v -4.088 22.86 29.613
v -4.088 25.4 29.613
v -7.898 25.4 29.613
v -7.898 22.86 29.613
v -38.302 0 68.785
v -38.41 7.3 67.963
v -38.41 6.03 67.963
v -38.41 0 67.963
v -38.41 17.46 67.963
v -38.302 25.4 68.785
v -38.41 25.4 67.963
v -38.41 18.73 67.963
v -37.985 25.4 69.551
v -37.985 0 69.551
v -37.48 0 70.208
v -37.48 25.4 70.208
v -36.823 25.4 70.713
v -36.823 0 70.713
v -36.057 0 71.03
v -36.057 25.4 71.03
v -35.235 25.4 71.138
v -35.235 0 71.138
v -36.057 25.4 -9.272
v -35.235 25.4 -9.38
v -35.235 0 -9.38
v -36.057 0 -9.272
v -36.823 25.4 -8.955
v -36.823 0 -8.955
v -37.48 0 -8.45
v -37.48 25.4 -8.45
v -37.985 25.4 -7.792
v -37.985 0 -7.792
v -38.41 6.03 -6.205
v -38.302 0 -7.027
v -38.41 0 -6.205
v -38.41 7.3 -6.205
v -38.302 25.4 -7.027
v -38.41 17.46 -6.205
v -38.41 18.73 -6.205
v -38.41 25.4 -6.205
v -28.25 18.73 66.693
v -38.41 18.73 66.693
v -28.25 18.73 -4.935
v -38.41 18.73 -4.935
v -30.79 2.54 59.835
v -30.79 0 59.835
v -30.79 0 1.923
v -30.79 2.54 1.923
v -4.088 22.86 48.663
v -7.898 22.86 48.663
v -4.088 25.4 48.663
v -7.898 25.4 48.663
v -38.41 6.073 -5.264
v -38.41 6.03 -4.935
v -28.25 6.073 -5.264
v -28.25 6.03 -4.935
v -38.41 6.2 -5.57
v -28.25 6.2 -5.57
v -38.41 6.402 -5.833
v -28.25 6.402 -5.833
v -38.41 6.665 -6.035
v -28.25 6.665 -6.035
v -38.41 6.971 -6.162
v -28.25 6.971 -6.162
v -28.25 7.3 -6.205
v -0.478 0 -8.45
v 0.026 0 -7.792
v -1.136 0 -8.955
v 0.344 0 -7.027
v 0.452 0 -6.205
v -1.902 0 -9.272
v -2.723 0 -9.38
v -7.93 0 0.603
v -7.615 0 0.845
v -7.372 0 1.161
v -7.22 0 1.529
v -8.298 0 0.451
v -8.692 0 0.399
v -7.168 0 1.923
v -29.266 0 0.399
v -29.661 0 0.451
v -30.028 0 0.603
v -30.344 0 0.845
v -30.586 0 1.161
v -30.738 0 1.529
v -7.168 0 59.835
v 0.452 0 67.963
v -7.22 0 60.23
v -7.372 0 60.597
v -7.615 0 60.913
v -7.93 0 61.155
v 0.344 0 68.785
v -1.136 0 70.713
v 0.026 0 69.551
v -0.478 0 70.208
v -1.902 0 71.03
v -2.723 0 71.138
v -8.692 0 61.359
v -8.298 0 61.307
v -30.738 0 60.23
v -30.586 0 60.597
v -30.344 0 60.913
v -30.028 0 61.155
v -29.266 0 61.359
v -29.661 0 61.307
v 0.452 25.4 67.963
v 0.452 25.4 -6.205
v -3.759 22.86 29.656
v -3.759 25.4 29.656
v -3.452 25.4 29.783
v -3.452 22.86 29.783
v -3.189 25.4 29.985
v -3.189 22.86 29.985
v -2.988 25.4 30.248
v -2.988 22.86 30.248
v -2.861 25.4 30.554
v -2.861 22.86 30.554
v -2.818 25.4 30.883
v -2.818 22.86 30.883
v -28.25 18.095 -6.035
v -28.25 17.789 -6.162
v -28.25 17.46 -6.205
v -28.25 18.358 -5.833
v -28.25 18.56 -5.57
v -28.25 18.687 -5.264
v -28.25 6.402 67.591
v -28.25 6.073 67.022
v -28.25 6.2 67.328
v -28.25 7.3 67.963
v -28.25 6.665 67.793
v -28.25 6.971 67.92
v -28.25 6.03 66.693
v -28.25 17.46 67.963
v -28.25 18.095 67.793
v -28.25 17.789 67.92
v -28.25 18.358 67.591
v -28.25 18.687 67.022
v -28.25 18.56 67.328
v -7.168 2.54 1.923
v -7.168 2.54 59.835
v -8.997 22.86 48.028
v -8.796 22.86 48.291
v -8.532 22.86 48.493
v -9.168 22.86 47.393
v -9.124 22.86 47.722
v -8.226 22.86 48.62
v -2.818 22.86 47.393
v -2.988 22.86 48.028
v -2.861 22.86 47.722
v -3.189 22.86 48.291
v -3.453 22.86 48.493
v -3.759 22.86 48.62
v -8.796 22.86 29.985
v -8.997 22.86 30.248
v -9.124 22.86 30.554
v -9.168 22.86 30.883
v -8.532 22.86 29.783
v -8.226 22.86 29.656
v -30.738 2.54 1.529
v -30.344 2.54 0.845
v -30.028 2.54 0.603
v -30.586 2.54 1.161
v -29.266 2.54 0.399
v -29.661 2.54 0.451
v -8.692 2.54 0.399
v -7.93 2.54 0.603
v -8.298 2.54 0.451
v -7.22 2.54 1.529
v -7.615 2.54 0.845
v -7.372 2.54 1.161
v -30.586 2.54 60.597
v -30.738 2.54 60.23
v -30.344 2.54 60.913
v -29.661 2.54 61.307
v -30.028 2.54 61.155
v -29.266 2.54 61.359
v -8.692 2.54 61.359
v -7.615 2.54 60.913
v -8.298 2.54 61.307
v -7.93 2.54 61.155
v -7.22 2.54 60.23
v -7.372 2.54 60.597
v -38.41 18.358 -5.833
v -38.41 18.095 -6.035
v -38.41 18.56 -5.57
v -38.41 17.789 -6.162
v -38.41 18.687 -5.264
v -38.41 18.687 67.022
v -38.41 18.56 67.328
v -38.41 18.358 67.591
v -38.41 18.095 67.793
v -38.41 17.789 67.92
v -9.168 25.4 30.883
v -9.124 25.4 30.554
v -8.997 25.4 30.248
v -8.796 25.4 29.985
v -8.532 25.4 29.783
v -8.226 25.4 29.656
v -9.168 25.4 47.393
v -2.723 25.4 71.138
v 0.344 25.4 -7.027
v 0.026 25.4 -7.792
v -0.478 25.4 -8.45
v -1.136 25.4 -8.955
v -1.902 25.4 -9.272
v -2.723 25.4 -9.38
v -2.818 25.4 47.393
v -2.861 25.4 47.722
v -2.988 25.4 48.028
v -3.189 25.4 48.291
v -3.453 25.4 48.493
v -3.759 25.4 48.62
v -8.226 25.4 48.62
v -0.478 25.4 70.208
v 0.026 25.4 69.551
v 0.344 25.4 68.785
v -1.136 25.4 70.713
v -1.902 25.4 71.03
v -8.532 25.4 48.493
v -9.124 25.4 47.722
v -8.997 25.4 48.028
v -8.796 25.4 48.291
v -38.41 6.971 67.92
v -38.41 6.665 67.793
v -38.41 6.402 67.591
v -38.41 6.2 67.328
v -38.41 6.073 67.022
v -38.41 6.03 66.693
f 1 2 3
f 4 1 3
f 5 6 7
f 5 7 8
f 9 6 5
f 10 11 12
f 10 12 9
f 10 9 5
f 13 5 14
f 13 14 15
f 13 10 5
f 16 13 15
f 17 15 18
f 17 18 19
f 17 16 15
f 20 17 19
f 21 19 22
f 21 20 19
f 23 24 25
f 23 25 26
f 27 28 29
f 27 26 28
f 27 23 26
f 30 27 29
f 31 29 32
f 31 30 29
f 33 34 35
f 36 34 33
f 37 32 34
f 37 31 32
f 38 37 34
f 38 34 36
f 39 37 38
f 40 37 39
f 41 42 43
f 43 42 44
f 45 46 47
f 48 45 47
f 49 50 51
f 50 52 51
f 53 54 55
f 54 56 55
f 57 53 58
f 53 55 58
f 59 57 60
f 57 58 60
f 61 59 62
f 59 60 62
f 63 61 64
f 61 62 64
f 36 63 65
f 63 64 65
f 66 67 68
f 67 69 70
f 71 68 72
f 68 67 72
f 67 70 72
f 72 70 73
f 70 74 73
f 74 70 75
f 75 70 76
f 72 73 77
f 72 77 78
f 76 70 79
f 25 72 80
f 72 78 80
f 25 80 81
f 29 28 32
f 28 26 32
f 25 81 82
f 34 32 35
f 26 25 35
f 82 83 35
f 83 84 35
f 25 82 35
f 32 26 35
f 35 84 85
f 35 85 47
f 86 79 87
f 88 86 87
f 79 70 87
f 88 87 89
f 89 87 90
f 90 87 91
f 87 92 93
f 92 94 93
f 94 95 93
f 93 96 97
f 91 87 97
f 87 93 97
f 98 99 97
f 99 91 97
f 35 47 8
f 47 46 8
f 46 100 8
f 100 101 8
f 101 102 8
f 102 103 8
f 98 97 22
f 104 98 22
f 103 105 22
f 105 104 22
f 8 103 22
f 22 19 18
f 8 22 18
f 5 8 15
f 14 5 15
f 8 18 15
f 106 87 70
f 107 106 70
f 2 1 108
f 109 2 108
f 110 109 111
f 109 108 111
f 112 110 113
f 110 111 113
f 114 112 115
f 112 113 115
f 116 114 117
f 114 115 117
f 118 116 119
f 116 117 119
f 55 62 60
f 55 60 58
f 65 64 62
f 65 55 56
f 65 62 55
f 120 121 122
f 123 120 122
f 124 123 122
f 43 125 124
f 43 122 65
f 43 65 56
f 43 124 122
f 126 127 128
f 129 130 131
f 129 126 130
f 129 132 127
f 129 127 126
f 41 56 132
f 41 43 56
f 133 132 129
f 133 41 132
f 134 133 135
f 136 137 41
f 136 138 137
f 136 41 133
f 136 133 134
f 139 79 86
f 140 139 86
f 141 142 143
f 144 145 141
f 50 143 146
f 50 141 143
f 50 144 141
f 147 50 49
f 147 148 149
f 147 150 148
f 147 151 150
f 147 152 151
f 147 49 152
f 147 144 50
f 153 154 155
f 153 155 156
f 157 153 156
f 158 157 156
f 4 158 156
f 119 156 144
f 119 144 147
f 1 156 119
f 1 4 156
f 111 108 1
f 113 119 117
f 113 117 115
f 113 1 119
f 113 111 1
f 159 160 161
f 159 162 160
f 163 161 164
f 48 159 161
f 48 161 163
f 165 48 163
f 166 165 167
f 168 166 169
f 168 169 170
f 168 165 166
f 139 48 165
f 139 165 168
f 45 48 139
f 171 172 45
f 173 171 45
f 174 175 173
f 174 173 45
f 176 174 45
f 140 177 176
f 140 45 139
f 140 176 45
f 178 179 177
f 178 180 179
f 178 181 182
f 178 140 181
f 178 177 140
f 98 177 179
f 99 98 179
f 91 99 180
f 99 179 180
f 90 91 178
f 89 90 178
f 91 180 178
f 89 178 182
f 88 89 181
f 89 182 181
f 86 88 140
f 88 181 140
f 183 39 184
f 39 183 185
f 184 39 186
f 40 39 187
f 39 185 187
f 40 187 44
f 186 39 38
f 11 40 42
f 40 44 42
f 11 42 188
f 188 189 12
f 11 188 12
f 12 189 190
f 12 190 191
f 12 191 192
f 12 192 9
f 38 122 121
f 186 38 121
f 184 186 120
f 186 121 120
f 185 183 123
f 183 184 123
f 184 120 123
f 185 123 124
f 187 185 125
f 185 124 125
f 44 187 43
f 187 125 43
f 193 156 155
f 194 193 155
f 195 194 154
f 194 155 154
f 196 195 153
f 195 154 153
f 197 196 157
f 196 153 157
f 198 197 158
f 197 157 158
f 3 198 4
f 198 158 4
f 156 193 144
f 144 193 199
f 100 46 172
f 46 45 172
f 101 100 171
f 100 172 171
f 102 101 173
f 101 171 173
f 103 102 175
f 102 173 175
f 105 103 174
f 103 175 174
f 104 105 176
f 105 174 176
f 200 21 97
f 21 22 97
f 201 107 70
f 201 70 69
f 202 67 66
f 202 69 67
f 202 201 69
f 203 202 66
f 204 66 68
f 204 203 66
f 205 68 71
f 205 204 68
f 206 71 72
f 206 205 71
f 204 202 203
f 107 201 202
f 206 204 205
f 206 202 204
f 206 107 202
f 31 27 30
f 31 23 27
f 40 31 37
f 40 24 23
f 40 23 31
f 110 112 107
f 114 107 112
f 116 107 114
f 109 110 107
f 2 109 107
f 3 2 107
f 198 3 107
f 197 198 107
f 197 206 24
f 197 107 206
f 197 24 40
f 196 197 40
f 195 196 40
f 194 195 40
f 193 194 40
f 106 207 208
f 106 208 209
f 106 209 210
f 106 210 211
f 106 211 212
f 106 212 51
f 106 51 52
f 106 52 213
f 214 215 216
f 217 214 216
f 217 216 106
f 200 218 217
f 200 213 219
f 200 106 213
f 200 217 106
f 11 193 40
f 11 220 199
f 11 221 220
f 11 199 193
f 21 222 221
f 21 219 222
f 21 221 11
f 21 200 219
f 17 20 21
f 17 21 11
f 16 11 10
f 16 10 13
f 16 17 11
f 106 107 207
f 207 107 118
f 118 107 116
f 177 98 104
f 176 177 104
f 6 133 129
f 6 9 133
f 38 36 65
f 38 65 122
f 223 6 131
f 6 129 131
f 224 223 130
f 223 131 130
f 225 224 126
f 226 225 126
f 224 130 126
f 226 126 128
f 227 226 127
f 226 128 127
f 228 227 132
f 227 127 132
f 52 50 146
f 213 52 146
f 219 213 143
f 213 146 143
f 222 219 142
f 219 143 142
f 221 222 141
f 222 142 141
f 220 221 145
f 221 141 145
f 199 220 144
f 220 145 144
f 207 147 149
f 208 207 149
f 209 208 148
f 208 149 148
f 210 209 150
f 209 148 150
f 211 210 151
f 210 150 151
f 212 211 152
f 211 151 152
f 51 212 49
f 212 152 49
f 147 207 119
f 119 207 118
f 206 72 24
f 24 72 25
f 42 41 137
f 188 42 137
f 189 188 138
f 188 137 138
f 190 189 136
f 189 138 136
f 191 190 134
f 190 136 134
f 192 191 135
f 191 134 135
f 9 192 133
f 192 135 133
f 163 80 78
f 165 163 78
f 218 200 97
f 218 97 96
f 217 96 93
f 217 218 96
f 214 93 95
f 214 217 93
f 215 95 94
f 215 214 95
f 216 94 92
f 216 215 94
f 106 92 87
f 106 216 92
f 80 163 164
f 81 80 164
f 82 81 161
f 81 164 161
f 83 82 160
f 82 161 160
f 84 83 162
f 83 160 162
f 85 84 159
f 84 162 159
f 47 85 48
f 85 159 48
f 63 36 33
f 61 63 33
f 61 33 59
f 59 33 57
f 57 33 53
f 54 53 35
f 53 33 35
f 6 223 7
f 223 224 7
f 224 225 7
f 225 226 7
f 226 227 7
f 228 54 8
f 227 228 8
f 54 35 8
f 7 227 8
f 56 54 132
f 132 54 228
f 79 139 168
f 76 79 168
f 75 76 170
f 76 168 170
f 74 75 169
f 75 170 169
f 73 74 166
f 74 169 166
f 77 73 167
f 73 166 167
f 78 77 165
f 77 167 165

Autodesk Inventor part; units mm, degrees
ref_plane "YZ Plane" through (0, 0, 0) normal (1, 0, 0) x (0, 1, 0)
ref_plane "XZ Plane" through (0, 0, 0) normal (0, 1, 0) x (-1, 0, 0)
ref_plane "XY Plane" through (0, 0, 0) normal (0, 0, 1) x (1, 0, 0)
sketch "Sketch2" plane through (0, 0, 0) normal (0, 1, 0) x (-1, 0, 0)
  line L0 (38.4103, 71.1381) -> (-0.4517, 71.1381)
  line L1 (-0.4517, 71.1381) -> (-0.4517, -9.3799)
  line L2 (-0.4517, -9.3799) -> (38.4103, -9.3799)
  line L3 (38.4103, -9.3799) -> (38.4103, 71.1381)
  point P0 (0, 0)
  dimension "d0" = 38.862
  dimension "d1" = 80.518
extrude "Extrusion1" add sketch "Sketch2" along normal blind 25.4
fillet "Fillet1" radius 3.175 4 edges at (-38.4103, 12.7, -9.3799) (0.4517, 12.7, -9.3799) (-38.4103, 12.7, 71.1381) (0.4517, 12.7, 71.1381)
sketch "Sketch3" plane through (0, 0, 0) normal (0, -1, 0) x (1, 0, 0)
  line L0 (-7.1683, 61.3591) -> (-30.7903, 61.3591)
  line L1 (-30.7903, 61.3591) -> (-30.7903, 0.3991)
  line L2 (-30.7903, 0.3991) -> (-7.1683, 0.3991)
  line L3 (-7.1683, 0.3991) -> (-7.1683, 61.3591)
  line L4 (-38.4103, -6.2049) -> (-38.4103, 67.9631) projected
  line L5 (-30.7903, 30.8791) -> (-38.4103, 30.8791) construction
  line L6 (-2.7233, -9.3799) -> (-35.2353, -9.3799) construction
  line L7 (-18.9793, 0.3991) -> (-18.9793, -9.3799) construction
  line L8 (-7.1683, 30.8791) -> (0.4517, 30.8791) construction
  line L9 (0.4517, 67.9631) -> (0.4517, -6.2049) construction
  line L10 (-18.9793, 61.3591) -> (-18.9793, 71.1381) construction
  line L11 (-35.2353, 71.1381) -> (-2.7233, 71.1381) construction
  point P0 (0, 0)
  dimension "d5" = 23.622
  dimension "d6" = 60.96
extrude "Extrusion2" cut sketch "Sketch3" against normal blind 2.54
fillet "Fillet2" radius 1.524 4 edges at (-30.7903, 1.27, 61.3591) (-30.7903, 1.27, 0.3991) (-7.1683, 1.27, 61.3591) (-7.1683, 1.27, 0.3991)
sketch "Sketch4" plane through (0.0246, 25.4, 6.6784) normal (0, 1, 0) x (1, 0, 0)
  line L0 (-2.8421, -22.9344) -> (-9.1921, -22.9344)
  line L1 (-9.1921, -22.9344) -> (-9.1921, -41.9844)
  line L2 (-9.1921, -41.9844) -> (-2.8421, -41.9844)
  line L3 (-2.8421, -41.9844) -> (-2.8421, -22.9344)
  point P0 (0, 0)
  dimension "d10" = 6.35
  dimension "d11" = 19.05
extrude "Extrusion3" cut sketch "Sketch4" against normal blind 2.54
fillet "Fillet3" radius 1.27 4 edges at (-9.1674, 24.13, 29.6127) (-2.8174, 24.13, 29.6127) (-9.1674, 24.13, 48.6627) (-2.8174, 24.13, 48.6627)
sketch "Sketch6" plane through (0.0246, 22.86, 6.6784) normal (0, 1, 0) x (1, 0, 0)
  line L0 (-7.8199, -3.1416) -> (-4.0099, -3.1416)
  line L1 (-4.0099, -3.1416) -> (-4.0099, 0.6684)
  line L2 (-4.0099, 0.6684) -> (-7.8199, 0.6684)
  line L3 (-7.8199, 0.6684) -> (-7.8199, -3.1416)
  line L4 (-7.8199, 6.6784) -> (-4.0099, 6.6784)
  line L5 (-4.0099, 6.6784) -> (-4.0099, 10.4884)
  line L6 (-4.0099, 10.4884) -> (-7.8199, 10.4884)
  line L7 (-7.8199, 10.4884) -> (-7.8199, 6.6784)
  point P0 (-0.0246, 6.6784)
  dimension "d16" = 3.81
  dimension "d17" = 3.81
  dimension "d18" = 3.81
  dimension "d19" = 3.81
extrude "Extrusion4" add sketch "Sketch6" along normal blind 2.54
extrude "Extrusion5" [suppressed]
sketch "Sketch8" plane through (-38.4103, 0, -6.2049) normal (-1, 0, 0) x (0, 0, 1)
  point P0 (6.2049, 0)
sketch "Sketch9" plane through (-38.4103, 0, -6.2049) normal (-1, 0, 0) x (0, 0, 1)
  point P0 (6.2049, 0)
sketch "Sketch10" plane through (-38.4103, 0, -6.2049) normal (-1, 0, 0) x (0, 0, 1)
  line L0 (74.168, 25.4) -> (74.168, 0) projected
  line L1 (0, 0) -> (0, 25.4) projected
  line L2 (74.168, 18.7302) -> (0, 18.7302)
  line L3 (0, 18.7302) -> (0, 6.0302)
  line L4 (0, 6.0302) -> (74.168, 6.0302)
  line L5 (74.168, 6.0302) -> (74.168, 18.7302)
  point P0 (6.2049, 0)
  dimension "d29" = 12.7
extrude "Extrusion6" cut sketch "Sketch10" against normal blind 10.16
fillet "Fillet4" radius 1.27 4 edges at (-33.3303, 18.7302, 67.9631) (-33.3303, 6.0302, 67.9631) (-33.3303, 18.7302, -6.2049) (-33.3303, 6.0302, -6.2049)
properties part number "Automoblox Body"
